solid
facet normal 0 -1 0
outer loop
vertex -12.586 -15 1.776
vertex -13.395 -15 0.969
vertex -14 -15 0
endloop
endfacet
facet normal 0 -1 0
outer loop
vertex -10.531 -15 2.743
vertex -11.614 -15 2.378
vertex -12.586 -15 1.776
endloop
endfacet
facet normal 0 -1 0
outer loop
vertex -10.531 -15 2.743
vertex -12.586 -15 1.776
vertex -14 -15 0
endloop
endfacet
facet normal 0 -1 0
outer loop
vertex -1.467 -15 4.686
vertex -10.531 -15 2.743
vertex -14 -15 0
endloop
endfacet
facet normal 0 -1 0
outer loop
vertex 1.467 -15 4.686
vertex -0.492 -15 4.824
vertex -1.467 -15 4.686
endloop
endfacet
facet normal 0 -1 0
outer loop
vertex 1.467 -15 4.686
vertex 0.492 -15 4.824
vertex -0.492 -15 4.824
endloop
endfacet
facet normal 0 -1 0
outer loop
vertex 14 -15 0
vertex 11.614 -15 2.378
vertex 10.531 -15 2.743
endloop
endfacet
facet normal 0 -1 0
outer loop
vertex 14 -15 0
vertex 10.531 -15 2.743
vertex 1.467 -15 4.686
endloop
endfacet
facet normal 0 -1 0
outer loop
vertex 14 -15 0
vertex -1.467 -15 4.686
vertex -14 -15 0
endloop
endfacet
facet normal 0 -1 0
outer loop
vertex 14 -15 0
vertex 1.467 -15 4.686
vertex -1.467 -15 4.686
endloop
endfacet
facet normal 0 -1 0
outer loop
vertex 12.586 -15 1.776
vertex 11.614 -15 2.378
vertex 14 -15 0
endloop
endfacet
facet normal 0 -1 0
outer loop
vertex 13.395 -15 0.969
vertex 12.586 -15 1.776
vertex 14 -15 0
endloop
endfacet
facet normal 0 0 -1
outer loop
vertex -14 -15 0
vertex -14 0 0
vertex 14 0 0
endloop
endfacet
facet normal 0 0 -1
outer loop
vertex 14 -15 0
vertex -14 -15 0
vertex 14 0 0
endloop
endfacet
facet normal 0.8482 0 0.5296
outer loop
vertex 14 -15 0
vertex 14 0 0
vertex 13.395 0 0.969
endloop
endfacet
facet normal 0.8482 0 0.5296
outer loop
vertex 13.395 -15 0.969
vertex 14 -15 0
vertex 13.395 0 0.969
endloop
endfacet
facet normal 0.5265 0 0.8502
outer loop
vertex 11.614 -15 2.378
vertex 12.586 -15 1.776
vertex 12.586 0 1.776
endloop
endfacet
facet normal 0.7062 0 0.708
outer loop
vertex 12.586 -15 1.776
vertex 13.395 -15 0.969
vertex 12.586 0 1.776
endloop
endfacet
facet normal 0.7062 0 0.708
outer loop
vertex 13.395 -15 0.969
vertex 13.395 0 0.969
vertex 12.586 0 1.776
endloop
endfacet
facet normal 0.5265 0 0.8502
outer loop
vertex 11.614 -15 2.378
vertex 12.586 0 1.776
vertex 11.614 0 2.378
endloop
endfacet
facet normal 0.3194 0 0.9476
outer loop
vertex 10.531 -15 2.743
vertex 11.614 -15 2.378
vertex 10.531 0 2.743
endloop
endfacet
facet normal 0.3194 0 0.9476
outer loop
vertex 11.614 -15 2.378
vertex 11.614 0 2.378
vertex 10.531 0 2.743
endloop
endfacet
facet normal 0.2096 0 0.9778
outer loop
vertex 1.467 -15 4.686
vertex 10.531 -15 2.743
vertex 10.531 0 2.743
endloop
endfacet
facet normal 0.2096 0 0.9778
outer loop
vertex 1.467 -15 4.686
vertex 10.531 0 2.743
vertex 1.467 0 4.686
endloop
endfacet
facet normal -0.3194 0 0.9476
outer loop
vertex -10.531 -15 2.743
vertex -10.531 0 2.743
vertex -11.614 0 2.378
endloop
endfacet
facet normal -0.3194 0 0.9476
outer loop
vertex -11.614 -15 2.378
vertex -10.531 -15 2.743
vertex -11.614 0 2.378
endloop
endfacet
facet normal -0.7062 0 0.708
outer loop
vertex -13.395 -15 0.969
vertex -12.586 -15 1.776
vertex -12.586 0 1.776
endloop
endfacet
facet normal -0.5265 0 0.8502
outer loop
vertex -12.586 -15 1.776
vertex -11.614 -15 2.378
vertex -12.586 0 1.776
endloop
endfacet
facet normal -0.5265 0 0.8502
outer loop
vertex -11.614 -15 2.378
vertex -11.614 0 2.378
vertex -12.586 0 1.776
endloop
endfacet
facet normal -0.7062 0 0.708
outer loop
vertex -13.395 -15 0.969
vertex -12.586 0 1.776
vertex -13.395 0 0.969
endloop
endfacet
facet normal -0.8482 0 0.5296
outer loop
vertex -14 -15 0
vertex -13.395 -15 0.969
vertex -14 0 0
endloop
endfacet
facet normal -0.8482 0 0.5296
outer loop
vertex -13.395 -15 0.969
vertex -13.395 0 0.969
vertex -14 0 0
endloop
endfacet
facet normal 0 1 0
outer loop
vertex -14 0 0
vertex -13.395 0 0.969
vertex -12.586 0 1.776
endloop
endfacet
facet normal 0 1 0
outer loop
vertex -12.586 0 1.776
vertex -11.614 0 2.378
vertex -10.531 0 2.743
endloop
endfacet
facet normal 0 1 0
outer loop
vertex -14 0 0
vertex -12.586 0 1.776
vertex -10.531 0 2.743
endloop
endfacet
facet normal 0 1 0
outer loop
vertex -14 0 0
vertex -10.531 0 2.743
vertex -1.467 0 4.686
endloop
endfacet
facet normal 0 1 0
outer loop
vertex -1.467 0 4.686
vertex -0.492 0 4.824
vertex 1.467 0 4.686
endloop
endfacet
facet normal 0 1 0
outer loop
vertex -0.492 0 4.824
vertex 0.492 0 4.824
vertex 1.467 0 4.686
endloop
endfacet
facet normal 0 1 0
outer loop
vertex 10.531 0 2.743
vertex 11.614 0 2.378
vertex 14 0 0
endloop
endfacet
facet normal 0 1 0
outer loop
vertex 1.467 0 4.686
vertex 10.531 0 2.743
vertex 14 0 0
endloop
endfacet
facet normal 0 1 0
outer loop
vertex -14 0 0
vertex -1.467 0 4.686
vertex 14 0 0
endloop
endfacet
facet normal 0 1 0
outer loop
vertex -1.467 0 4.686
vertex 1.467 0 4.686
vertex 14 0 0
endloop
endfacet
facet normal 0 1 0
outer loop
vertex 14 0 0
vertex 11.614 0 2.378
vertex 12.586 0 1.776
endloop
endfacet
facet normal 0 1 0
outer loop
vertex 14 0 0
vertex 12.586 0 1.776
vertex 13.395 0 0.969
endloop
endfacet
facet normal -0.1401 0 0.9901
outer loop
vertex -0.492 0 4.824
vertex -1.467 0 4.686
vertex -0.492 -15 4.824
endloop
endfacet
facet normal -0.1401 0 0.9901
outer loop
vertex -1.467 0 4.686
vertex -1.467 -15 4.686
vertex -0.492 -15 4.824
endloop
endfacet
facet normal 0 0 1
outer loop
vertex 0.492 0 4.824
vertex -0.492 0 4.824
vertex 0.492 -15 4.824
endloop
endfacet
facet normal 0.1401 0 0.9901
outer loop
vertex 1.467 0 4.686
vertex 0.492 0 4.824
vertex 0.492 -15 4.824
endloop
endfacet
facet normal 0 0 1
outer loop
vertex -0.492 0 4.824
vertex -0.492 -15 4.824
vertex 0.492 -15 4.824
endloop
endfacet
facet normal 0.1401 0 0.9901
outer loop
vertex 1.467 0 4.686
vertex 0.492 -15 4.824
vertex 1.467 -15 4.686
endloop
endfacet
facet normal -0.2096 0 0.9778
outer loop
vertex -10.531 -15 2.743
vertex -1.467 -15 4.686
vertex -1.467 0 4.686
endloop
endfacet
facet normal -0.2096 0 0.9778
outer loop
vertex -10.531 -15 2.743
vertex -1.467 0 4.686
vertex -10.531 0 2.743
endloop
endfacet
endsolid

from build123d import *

# Parameters (mm, degrees)
F1_DEPTH    = 15
F2_T1_DEPTH = 32.7362862295
F3_R        = 7


# Not quite as in the source:
# - a fillet or chamfer that OpenCascade refuses, or shapes differently, is made with other operations: its cross-section is extruded or revolved along the edge and cut away or added


with BuildPart() as f1:
    # F0 (on Front) → F1 (new body)
    with BuildSketch(Plane.XZ):
        Polygon((-14, 0), (14, 0), (14, 2), (0, 5), (-14, 2), align=None)
    extrude(amount=F1_DEPTH)

    # F2: fillet of radius 5 on 2 edges, made by hand

    # F2_s2 → F2_t1 (cut)
    with BuildSketch(Plane.XZ.offset(-8.8681431148)):
        with BuildLine():
            ThreePointArc((-10.5314833016, 2.7432535782), (-12.5855065639, 1.7759313526), (-14, 0))
            Line((-14, 0), (-14, 2))
            Line((-14, 2), (-10.5314833016, 2.7432535782))
        make_face()
        with BuildLine():
            ThreePointArc((14, 0), (12.5855065639, 1.7759313526), (10.5314833016, 2.7432535782))
            Line((10.5314833016, 2.7432535782), (14, 2))
            Line((14, 2), (14, 0))
        make_face()
    extrude(amount=F2_T1_DEPTH, mode=Mode.SUBTRACT)

    # F3
    f3_edges = [f1.edges().sort_by_distance(p)[0] for p in [
        (0, -7.5, 5),
    ]]
    fillet(f3_edges, radius=F3_R)


solid = f1.part
